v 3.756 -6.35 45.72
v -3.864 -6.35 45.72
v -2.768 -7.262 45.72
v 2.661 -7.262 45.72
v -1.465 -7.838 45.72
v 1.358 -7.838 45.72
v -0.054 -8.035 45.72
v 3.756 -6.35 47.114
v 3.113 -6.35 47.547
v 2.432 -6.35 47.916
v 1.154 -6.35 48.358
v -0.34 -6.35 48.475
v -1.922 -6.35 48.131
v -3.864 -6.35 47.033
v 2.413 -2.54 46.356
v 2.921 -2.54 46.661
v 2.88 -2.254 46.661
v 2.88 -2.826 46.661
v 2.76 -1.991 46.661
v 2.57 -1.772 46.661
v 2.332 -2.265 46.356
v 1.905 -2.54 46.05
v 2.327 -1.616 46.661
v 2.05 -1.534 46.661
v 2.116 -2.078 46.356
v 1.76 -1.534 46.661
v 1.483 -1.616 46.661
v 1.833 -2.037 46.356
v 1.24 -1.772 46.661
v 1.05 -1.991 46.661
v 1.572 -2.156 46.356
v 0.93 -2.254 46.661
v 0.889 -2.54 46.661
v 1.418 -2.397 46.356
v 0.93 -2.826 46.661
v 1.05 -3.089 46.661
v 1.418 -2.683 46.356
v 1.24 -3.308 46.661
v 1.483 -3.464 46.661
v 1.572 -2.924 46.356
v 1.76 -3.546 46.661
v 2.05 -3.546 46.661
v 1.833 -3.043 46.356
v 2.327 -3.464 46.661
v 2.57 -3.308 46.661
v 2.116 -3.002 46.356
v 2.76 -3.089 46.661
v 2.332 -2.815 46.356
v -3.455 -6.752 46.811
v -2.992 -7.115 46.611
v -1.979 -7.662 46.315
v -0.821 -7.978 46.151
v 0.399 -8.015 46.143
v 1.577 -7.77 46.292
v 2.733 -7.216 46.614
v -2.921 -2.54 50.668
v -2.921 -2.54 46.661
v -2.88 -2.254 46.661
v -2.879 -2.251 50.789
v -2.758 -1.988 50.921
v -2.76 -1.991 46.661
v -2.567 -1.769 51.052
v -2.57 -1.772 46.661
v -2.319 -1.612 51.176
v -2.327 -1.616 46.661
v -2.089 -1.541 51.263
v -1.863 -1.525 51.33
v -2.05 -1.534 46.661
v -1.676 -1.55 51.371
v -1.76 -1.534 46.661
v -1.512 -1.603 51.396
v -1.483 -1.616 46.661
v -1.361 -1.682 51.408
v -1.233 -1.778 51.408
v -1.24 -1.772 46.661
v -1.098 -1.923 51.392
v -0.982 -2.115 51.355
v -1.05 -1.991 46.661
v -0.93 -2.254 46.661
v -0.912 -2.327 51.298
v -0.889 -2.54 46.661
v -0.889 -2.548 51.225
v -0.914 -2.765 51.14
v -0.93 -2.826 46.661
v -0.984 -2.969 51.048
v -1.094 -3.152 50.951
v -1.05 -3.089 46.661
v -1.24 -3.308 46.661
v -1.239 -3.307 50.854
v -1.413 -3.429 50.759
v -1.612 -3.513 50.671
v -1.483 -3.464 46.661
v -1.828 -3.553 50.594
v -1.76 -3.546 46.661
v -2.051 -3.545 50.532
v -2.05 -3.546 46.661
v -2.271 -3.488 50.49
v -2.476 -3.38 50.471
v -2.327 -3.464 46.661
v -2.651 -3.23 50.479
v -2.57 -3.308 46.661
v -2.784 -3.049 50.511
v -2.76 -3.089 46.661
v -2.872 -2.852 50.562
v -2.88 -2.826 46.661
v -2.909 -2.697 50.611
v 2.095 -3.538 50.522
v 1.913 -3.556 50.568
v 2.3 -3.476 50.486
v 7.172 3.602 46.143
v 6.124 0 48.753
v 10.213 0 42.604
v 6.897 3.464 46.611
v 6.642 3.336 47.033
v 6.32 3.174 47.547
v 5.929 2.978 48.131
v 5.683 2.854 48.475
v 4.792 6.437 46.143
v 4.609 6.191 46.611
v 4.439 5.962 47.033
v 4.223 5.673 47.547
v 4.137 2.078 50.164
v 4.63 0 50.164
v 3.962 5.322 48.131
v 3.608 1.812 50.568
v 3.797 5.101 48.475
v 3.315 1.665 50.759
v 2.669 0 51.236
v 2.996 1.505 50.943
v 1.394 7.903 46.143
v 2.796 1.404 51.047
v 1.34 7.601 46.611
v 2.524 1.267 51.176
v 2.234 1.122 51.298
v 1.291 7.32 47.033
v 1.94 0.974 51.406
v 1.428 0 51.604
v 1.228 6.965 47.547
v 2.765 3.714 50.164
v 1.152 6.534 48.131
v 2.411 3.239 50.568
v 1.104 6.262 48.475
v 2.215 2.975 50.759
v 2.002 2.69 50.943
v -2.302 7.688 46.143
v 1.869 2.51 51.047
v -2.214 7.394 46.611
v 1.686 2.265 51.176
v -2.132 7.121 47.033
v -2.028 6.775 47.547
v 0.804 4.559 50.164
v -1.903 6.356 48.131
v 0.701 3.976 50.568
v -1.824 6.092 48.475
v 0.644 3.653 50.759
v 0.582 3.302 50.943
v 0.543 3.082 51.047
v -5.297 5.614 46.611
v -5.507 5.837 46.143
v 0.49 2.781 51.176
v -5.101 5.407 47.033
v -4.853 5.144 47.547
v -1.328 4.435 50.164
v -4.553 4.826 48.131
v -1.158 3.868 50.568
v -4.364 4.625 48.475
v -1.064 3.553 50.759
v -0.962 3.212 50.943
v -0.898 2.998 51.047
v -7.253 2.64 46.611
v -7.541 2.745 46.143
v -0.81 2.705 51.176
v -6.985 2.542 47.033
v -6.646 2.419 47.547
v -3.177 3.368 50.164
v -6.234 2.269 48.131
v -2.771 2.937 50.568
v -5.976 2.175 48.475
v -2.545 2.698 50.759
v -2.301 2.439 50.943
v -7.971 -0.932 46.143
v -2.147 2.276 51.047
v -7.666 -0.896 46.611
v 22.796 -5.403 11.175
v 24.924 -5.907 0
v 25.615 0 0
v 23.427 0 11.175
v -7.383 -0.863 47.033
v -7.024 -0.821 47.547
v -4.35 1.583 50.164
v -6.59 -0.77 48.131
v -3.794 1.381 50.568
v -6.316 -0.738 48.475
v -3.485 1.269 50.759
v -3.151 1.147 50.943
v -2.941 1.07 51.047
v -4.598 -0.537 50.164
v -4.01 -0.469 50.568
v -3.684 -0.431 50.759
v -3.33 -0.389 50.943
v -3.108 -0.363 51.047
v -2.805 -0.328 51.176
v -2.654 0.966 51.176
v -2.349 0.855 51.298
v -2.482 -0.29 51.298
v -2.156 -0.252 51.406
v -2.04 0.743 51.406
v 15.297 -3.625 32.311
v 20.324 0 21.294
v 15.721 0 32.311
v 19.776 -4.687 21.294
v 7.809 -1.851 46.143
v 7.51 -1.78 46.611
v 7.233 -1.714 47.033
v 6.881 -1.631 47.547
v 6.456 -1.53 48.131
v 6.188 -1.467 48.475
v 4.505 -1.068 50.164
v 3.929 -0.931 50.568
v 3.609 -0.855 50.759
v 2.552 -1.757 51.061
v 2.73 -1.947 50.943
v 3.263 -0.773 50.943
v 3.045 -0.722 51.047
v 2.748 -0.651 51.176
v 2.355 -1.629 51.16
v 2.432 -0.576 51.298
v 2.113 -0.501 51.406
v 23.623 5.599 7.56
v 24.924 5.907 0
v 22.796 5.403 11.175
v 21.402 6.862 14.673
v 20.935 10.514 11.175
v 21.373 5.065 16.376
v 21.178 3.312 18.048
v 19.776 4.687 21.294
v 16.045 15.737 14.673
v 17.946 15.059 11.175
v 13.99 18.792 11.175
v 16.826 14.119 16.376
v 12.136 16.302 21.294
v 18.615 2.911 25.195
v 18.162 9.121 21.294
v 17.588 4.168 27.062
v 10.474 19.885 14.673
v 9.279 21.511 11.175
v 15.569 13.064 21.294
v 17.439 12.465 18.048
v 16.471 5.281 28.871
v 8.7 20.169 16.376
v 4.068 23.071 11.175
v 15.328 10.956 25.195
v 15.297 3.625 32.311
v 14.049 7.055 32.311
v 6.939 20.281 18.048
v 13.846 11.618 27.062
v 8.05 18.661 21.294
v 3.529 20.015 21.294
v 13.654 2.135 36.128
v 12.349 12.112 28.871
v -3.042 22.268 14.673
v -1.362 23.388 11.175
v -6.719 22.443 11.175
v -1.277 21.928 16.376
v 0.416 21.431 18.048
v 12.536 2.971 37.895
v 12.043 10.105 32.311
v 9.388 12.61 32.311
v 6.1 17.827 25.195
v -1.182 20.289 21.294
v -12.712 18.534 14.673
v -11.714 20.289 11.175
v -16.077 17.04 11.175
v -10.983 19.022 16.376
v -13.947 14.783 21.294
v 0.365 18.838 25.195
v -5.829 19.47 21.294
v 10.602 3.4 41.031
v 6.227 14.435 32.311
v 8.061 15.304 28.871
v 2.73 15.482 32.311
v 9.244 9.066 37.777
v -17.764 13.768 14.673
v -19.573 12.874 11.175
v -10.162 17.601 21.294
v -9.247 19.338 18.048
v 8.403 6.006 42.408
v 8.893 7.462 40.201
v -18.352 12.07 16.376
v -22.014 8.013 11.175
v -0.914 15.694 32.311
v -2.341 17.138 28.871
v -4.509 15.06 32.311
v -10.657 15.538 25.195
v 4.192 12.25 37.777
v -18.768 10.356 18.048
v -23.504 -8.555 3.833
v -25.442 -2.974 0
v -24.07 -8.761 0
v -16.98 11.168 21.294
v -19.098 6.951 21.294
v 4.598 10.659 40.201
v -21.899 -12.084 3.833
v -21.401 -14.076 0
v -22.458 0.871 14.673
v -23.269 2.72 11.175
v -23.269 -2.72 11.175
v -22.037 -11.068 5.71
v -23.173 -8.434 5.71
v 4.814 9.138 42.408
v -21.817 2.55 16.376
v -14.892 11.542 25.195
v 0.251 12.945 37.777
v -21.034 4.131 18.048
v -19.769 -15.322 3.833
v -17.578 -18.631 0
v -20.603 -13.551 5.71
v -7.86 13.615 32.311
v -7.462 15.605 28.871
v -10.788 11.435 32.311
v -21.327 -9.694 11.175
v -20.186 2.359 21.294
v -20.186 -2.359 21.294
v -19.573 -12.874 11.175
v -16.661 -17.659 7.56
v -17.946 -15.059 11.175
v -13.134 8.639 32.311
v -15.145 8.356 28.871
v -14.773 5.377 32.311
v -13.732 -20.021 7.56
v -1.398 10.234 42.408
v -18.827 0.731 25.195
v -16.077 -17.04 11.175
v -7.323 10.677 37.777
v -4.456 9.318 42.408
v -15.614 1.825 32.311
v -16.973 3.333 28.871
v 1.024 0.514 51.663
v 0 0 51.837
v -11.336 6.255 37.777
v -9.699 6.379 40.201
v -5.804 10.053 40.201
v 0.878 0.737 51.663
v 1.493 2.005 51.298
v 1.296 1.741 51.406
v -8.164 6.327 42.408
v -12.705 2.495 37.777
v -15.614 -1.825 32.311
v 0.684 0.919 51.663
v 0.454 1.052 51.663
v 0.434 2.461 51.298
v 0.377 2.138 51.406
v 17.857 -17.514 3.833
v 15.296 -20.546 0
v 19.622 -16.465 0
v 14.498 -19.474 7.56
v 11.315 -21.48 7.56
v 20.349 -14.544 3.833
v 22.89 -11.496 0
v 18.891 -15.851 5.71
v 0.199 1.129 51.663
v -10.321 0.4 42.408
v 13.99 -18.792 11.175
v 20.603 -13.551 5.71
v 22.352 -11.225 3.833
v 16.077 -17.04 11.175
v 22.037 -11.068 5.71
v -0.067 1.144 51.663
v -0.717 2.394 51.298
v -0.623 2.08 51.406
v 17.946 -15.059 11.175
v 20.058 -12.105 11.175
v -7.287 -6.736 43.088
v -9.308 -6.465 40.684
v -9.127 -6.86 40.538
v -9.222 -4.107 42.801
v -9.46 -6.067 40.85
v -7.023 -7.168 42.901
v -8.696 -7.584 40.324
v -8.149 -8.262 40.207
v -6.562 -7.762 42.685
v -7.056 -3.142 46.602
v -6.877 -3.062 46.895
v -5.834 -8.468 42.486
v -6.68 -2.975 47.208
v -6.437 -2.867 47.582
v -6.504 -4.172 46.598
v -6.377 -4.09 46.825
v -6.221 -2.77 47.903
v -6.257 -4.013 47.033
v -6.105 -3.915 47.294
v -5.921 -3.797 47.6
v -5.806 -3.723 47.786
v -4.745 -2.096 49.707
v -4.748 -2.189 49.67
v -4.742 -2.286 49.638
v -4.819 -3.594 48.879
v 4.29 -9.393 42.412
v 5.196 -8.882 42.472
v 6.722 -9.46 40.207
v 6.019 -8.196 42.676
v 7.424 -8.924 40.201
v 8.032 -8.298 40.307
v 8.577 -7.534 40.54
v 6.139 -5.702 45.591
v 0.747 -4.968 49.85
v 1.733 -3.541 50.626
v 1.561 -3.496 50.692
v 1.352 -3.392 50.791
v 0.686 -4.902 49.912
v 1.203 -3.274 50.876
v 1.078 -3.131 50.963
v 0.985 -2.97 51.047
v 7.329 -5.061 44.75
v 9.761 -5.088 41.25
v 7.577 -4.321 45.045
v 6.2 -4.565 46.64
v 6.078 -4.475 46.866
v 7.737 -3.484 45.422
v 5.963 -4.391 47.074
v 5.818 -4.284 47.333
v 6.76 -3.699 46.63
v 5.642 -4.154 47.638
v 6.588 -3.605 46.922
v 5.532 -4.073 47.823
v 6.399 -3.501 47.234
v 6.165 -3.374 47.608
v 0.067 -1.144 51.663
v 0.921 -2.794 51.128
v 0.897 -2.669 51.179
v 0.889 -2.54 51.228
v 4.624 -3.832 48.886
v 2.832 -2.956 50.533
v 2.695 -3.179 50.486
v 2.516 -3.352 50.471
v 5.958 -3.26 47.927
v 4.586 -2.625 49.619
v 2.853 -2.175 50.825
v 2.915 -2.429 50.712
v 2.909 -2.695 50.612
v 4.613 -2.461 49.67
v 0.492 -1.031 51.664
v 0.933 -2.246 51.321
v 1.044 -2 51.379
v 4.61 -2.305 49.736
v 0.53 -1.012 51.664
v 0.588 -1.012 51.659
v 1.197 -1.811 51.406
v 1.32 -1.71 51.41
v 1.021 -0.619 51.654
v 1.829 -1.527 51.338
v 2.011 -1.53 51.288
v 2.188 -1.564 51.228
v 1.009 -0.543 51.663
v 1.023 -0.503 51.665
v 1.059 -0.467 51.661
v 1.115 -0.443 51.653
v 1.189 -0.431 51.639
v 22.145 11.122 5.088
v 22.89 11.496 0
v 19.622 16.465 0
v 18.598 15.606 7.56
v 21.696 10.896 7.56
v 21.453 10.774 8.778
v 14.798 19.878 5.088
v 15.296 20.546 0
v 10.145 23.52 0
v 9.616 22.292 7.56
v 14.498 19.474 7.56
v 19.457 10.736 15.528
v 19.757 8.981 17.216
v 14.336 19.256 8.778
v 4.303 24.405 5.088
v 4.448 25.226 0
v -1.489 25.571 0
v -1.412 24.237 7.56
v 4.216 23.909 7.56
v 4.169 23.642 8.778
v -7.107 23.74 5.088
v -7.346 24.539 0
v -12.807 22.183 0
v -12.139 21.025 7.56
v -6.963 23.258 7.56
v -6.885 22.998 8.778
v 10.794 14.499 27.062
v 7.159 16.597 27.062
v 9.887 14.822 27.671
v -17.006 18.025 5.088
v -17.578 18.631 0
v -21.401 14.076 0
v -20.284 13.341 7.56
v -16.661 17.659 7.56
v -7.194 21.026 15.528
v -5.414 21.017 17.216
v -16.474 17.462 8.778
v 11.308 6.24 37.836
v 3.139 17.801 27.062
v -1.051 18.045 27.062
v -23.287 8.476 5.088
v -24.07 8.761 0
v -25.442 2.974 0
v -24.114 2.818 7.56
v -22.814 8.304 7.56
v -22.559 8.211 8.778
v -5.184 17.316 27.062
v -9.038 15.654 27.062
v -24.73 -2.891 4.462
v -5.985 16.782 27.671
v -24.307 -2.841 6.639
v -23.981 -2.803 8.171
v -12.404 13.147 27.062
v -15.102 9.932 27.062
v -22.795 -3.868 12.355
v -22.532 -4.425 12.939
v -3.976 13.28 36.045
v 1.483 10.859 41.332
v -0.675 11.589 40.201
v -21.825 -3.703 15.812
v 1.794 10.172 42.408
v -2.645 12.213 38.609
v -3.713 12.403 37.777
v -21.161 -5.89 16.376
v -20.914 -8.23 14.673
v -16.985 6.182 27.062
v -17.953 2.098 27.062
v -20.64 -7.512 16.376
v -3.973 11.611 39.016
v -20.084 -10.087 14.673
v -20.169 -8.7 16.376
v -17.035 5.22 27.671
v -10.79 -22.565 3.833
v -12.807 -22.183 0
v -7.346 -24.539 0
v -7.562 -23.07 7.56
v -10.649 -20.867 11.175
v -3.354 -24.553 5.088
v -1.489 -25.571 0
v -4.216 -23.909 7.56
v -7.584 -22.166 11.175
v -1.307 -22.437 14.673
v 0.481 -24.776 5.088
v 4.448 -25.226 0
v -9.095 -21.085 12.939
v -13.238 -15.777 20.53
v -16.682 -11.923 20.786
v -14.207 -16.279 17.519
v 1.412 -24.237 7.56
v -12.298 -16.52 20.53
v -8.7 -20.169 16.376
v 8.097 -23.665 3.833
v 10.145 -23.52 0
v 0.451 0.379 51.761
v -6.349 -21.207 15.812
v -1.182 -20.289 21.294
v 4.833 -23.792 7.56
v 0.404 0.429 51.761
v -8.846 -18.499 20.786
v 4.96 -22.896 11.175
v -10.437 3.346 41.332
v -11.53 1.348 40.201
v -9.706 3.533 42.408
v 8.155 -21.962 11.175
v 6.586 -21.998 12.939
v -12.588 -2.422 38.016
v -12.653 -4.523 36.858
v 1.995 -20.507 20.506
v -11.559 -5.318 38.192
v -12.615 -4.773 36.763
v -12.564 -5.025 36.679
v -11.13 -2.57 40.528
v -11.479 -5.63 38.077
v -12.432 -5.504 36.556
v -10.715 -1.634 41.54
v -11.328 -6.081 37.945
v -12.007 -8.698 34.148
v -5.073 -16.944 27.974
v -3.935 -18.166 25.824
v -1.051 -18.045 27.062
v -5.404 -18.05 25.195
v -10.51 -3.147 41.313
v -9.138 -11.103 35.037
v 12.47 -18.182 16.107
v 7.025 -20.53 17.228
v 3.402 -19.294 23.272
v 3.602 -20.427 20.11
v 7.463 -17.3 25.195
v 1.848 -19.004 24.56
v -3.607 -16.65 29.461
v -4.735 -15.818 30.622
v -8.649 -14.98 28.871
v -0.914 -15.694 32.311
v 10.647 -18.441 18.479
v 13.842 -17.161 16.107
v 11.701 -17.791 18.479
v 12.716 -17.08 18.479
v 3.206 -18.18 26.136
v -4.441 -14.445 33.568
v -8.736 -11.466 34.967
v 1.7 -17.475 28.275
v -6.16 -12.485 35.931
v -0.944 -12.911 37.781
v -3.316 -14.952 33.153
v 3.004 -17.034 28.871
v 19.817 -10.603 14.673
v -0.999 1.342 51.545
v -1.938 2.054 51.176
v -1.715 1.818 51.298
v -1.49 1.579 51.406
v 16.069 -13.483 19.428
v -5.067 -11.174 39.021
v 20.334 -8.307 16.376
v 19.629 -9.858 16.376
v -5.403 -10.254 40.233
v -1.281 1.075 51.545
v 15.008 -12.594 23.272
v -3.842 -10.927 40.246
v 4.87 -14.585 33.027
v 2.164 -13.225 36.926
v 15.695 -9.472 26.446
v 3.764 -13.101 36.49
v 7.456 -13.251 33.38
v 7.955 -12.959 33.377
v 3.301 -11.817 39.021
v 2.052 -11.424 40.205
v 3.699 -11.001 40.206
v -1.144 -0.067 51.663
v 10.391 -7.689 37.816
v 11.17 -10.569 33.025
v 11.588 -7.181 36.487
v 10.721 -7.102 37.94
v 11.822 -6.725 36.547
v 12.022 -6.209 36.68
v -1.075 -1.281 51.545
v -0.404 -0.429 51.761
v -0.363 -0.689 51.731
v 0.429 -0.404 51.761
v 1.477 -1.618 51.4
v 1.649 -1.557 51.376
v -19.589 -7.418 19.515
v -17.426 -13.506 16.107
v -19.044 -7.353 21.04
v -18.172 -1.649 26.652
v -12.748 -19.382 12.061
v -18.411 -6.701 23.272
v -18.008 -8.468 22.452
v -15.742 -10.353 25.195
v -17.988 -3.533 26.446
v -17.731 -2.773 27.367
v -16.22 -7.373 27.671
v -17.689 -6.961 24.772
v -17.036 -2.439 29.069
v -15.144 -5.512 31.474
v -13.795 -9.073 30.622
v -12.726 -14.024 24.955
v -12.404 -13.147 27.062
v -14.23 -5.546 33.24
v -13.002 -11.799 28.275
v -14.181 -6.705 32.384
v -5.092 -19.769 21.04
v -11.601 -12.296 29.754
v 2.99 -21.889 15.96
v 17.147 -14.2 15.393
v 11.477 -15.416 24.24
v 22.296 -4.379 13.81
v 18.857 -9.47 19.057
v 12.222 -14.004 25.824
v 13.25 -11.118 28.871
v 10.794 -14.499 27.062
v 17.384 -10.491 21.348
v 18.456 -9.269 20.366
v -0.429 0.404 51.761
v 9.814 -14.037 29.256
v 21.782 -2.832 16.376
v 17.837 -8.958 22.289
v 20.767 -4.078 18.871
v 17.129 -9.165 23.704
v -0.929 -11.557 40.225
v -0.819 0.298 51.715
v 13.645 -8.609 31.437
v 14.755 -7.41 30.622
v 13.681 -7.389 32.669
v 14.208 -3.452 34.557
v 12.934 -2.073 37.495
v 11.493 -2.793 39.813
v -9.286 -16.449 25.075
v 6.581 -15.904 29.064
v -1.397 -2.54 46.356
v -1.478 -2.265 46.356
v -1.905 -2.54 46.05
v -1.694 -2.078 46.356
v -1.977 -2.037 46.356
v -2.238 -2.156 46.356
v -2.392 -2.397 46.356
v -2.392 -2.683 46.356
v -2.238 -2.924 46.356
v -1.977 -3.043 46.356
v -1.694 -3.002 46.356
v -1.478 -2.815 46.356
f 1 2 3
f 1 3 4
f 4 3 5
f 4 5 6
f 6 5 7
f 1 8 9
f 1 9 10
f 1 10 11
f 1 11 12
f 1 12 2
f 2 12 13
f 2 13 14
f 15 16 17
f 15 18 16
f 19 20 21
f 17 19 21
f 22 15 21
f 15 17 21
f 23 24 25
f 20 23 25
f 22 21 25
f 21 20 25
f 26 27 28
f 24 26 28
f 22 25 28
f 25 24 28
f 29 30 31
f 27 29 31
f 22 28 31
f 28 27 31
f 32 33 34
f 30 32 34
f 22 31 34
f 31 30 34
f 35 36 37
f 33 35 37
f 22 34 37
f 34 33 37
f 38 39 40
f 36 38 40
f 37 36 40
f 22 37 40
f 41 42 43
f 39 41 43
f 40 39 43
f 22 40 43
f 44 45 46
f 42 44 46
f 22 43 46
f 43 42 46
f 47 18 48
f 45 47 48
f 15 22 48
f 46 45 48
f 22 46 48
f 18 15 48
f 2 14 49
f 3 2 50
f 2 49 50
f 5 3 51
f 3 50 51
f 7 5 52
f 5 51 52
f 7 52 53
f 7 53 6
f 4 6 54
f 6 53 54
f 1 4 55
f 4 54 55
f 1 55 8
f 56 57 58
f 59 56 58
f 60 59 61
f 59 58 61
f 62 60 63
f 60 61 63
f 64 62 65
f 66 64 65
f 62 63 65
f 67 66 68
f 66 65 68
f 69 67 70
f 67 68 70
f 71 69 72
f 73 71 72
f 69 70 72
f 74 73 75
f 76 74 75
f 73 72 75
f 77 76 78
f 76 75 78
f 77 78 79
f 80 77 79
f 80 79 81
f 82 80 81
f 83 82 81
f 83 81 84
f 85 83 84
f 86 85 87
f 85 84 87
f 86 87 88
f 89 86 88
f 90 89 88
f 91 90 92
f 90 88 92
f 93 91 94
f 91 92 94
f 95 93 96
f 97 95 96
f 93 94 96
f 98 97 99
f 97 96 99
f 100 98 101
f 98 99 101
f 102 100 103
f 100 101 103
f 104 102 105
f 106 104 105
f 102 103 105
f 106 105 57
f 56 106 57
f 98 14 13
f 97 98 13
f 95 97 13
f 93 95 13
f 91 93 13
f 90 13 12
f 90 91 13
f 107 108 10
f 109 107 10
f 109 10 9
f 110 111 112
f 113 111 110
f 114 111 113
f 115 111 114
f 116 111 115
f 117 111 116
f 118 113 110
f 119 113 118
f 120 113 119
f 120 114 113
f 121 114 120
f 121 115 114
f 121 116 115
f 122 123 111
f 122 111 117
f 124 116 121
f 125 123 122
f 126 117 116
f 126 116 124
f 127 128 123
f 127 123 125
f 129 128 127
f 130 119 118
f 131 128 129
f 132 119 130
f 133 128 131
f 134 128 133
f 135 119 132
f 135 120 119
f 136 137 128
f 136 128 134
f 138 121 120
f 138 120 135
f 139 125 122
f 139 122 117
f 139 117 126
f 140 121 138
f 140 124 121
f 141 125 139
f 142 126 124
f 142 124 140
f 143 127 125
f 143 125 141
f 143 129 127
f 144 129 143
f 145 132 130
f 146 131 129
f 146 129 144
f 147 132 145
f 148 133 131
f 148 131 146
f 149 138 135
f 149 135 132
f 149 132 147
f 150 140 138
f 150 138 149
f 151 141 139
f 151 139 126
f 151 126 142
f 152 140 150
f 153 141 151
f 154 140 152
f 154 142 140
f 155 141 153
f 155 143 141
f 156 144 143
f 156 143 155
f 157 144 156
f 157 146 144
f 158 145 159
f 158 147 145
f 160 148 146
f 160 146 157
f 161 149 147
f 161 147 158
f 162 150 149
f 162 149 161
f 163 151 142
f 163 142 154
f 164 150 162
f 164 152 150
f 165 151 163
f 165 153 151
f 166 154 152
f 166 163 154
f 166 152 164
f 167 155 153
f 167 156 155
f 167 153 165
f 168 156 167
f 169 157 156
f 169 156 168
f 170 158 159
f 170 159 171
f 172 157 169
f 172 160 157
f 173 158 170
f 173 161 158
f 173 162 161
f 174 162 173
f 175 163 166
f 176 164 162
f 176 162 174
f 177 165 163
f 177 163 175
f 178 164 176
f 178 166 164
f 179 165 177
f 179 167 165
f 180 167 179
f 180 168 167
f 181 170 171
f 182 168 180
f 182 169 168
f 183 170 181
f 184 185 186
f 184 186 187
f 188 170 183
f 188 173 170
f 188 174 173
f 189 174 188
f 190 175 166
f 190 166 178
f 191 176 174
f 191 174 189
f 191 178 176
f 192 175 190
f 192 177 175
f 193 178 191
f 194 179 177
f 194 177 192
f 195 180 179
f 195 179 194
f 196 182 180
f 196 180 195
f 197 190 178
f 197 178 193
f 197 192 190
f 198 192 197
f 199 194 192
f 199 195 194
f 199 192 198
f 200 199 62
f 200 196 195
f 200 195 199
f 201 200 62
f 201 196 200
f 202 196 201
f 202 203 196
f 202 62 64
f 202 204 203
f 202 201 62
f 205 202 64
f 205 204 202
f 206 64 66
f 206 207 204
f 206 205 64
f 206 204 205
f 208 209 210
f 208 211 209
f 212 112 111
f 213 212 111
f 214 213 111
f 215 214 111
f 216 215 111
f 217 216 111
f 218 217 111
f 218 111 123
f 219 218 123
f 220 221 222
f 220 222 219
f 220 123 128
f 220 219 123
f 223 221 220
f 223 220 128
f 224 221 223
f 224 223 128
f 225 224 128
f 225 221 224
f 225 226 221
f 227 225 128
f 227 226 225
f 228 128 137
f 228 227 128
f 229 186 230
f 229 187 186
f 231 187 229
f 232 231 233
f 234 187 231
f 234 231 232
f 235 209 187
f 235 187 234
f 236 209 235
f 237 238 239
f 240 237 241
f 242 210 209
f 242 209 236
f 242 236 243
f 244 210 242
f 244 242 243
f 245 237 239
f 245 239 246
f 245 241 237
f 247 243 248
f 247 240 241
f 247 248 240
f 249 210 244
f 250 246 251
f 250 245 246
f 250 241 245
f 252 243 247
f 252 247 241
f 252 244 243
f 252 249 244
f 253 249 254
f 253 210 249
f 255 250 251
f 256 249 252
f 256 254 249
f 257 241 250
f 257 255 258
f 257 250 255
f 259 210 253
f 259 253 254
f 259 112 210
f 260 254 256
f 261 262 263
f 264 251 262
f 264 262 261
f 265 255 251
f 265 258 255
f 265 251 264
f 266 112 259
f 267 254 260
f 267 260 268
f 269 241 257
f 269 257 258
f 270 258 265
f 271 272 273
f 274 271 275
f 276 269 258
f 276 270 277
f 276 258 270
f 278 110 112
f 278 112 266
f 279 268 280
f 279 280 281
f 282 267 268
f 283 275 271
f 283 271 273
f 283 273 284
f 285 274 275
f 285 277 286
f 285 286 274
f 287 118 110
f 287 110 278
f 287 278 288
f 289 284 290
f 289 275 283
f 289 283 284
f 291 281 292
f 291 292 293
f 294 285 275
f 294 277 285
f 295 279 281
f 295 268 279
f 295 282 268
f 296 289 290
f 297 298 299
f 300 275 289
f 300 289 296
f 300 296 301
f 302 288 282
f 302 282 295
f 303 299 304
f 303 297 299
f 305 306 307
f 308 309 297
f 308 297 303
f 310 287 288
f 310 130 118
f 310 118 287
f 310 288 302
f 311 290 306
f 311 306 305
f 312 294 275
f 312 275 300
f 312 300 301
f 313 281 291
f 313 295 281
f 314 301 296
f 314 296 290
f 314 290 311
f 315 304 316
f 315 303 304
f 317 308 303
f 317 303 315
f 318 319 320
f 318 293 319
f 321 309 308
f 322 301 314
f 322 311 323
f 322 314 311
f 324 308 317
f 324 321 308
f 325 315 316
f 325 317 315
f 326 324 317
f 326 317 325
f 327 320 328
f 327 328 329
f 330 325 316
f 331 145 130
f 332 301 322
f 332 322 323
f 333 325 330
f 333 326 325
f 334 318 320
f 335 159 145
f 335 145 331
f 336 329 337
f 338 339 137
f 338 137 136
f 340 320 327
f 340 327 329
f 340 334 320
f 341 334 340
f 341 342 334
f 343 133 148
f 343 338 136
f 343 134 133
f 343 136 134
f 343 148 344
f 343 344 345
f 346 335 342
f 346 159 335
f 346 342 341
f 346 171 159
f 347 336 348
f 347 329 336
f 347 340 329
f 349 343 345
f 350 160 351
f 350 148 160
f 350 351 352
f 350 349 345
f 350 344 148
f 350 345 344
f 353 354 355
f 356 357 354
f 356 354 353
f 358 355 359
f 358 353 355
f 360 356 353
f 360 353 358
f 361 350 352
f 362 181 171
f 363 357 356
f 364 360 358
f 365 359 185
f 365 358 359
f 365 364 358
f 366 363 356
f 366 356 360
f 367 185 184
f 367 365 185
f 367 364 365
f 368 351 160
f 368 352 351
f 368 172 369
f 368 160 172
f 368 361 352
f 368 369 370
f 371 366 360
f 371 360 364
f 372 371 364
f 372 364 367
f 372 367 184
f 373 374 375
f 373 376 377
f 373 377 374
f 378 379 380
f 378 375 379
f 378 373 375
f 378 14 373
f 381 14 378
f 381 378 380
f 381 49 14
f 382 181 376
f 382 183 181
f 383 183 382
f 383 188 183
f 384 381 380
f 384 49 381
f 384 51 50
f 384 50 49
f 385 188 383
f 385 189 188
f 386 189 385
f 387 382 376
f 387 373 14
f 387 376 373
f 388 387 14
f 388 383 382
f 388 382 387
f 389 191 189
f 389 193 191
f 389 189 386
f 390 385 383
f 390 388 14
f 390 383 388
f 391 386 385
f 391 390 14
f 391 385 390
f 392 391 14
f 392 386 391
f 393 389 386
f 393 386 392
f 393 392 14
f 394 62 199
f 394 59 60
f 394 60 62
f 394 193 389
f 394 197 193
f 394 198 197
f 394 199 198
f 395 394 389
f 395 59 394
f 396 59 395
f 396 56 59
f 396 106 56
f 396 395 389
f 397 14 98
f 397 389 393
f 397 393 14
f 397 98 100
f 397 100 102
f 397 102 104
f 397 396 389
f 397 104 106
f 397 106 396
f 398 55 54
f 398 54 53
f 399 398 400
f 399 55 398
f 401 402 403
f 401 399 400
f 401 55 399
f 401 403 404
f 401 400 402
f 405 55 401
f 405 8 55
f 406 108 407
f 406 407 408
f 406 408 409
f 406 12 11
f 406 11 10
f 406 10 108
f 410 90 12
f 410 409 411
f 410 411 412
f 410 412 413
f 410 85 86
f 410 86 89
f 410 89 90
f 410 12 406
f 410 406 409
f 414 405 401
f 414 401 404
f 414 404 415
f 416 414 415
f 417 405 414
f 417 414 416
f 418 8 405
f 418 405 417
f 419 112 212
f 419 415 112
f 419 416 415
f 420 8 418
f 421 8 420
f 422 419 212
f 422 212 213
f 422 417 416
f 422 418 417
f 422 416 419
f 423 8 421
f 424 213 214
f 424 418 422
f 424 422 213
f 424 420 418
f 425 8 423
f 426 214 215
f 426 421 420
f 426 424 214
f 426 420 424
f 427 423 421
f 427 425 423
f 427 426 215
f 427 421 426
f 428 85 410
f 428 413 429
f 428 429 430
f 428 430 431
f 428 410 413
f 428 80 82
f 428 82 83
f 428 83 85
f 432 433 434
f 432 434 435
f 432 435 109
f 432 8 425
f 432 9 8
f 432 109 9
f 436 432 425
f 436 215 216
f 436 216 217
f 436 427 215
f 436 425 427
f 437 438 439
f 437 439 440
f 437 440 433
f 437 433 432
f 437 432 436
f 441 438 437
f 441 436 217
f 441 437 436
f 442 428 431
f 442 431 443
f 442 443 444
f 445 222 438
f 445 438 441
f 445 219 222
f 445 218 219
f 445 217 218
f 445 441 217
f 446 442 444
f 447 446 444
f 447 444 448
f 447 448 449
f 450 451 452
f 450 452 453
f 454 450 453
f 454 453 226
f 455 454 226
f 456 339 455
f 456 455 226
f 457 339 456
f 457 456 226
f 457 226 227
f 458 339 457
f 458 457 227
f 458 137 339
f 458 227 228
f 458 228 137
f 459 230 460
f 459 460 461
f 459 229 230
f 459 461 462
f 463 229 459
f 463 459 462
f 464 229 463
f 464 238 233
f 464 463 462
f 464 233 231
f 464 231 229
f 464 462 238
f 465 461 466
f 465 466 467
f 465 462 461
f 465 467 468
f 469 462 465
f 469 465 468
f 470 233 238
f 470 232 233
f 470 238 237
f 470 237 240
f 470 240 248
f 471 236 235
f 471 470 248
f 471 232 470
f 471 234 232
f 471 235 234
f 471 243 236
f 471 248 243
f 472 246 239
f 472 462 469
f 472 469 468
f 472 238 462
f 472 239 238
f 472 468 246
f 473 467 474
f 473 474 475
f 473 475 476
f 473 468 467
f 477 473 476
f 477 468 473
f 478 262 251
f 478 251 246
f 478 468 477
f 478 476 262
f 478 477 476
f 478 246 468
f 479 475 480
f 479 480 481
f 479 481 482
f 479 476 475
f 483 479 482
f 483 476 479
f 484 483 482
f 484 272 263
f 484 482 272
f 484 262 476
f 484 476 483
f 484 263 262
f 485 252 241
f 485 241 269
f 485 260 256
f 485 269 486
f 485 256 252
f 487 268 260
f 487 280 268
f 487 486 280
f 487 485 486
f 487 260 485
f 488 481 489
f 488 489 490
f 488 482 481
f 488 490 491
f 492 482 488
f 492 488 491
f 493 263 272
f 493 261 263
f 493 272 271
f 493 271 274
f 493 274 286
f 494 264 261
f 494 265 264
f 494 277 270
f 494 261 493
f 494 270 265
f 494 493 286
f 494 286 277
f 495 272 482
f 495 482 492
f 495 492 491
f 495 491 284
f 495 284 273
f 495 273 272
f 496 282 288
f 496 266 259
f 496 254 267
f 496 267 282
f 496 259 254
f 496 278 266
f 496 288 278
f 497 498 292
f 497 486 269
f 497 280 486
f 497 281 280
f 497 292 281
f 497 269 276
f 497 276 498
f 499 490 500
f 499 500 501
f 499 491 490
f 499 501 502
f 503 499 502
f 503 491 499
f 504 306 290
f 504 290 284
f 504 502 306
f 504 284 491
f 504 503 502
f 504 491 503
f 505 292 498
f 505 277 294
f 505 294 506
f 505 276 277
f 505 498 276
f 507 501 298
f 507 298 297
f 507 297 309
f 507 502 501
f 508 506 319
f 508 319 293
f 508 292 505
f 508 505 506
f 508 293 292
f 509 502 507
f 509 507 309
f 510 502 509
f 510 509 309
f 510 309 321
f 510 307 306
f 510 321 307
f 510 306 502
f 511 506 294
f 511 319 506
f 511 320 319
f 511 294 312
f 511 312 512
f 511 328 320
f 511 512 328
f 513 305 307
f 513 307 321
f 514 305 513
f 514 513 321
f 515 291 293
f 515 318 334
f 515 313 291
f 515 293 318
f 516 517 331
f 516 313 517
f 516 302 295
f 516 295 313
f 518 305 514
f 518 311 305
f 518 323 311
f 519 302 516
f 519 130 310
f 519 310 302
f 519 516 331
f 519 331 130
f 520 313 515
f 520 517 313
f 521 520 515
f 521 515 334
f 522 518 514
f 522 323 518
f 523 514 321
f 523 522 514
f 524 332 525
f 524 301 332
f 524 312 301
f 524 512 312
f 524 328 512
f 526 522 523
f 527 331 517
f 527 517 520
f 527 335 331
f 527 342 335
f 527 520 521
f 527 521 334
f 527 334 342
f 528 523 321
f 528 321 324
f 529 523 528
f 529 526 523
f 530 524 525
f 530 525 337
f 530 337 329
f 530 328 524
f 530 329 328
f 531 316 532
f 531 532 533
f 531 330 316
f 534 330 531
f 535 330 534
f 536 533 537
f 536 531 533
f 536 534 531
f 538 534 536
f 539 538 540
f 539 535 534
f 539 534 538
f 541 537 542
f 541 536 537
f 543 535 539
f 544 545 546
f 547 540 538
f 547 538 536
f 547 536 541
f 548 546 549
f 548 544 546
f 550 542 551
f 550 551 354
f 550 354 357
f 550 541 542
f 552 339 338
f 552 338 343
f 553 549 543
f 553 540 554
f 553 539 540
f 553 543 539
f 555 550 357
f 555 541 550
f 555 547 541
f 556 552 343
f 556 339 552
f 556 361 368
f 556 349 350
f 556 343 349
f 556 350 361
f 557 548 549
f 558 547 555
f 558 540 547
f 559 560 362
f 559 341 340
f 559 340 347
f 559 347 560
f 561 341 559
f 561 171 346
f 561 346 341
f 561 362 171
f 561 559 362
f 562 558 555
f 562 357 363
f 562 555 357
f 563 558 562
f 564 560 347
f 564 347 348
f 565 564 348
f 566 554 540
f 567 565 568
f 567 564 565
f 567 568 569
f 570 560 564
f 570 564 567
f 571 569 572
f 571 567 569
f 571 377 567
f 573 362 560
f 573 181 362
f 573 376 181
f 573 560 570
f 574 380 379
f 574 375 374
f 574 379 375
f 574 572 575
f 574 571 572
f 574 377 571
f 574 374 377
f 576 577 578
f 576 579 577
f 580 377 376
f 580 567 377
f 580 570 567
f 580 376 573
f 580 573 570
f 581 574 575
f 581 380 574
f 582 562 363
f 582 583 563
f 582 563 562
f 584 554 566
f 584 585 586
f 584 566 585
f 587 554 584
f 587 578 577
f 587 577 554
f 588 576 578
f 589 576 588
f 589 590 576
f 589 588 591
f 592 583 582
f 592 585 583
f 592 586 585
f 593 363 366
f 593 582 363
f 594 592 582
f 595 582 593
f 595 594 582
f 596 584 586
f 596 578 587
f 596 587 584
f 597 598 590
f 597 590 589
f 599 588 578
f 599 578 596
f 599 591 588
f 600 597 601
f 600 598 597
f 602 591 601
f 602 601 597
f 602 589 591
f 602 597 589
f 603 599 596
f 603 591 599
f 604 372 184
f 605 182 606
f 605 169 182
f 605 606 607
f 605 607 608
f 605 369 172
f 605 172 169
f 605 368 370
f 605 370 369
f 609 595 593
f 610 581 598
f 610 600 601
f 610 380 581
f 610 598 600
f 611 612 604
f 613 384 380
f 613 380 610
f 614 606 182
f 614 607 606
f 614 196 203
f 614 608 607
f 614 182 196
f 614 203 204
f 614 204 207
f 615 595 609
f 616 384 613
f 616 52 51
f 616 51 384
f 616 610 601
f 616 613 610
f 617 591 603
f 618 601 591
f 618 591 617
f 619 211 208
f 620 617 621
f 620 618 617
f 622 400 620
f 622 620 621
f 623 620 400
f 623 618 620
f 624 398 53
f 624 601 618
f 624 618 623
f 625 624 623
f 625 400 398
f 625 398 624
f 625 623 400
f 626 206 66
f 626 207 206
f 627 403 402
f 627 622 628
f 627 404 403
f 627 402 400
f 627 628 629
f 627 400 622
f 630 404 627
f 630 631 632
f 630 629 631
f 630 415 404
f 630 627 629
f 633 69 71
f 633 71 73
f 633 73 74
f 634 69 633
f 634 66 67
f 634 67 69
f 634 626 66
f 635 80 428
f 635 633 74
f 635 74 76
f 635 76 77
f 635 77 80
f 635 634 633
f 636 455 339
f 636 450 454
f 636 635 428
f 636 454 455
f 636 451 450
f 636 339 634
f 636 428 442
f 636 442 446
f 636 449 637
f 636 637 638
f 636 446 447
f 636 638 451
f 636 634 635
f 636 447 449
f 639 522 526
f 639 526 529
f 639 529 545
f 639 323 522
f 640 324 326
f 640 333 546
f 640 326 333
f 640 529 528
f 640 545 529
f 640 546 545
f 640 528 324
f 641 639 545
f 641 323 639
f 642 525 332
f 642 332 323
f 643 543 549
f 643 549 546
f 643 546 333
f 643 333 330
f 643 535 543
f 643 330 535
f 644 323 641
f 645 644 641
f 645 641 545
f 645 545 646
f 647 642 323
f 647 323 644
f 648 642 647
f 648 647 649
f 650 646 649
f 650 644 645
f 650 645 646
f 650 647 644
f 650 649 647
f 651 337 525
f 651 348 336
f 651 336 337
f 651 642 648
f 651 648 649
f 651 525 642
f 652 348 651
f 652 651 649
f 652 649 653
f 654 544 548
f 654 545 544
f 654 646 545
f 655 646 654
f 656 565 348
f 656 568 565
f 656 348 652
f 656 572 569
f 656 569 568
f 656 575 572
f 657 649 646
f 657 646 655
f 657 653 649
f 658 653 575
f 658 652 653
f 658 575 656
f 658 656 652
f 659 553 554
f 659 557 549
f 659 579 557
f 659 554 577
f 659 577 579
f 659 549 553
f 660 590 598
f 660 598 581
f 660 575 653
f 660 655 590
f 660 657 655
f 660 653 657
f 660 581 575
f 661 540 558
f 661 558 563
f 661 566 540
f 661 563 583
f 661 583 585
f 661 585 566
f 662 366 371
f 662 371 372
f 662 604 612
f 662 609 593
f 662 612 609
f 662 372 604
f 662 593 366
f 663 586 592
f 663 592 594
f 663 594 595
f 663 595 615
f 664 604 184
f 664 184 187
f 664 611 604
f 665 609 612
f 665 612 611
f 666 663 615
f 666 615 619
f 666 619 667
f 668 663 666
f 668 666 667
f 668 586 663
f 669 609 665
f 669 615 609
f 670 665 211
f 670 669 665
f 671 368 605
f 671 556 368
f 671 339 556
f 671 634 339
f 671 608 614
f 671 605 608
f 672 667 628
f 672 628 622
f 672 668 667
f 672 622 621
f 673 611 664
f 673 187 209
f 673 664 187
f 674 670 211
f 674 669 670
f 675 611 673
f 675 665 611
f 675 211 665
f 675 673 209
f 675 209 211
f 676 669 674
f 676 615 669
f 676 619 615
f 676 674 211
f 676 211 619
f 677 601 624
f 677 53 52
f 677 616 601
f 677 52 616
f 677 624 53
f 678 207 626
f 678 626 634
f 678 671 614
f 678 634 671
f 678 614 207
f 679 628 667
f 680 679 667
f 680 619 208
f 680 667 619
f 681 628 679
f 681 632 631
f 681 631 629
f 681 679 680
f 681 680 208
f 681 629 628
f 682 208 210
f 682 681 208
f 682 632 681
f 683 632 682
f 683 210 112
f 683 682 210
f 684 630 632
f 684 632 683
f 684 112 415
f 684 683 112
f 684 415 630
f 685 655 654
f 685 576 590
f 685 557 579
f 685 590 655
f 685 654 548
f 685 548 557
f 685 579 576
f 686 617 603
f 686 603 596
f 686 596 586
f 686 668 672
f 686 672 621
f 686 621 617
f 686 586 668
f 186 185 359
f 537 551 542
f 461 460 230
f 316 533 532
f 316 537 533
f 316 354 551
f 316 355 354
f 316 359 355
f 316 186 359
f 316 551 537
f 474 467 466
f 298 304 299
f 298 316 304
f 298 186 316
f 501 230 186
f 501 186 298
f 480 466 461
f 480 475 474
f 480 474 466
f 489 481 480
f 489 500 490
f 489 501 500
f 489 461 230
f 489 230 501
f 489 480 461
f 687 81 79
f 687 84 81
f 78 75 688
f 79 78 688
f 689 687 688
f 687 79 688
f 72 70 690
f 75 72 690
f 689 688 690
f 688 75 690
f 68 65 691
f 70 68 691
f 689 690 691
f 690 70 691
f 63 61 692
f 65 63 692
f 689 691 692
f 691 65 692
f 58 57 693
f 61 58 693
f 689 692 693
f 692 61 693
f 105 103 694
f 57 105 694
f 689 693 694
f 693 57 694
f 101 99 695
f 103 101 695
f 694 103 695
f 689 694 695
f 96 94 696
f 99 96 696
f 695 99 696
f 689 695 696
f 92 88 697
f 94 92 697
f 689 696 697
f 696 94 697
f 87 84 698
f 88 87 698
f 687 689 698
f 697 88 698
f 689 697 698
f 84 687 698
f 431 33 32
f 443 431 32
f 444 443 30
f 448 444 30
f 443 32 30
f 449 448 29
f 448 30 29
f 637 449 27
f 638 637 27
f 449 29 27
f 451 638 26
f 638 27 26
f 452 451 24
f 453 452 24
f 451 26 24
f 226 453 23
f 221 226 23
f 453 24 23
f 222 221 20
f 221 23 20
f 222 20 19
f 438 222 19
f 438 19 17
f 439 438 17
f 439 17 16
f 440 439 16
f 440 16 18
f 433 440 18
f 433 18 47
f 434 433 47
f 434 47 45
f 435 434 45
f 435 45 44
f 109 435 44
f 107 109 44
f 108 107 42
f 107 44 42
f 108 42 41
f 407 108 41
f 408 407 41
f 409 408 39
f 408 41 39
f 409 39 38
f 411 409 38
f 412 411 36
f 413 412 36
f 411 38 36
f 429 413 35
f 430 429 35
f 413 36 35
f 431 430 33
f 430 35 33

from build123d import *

# Parameters (mm, degrees)
F4_D     = 2.032
F4_DEPTH = 3.81
F4_START = 13.0290755
F4_TIP   = 0.6104743889
F5_DEPTH = 17.78


with BuildPart() as f1:
    # F0 (on Front) → F1 (revolve)
    with BuildSketch(Plane.XZ):
        with BuildLine():
            Line((0, 51.8371127546), (0, 0))
            Line((0, 0), (25.6147161126, 0))
            add(Edge.make_bspline(
                [(25.6147161126, 0), (22.8049212909, 20.5093036404), (9.6490421389, 44.5611330733), (4.4700330506, 51.3505992855), (0, 51.8371127546)],
                knots=[0, 0, 0, 0, 0.6778847742, 1, 1, 1, 1], degree=3))
        make_face()
    revolve(axis=Axis((0, 0, 25.9185563773), (0, 0, 1)))

    # F4
    # its depths count from where the whole tool has entered the part; down to there all is cleared
    with Locations(Plane.XY.offset(63.5)):
        with Locations((-1.905, -2.54), (1.905, -2.54)):
            Hole(F4_D / 2, depth=F4_START)
    with Locations(Plane.XY.offset(63.5).offset(-F4_START)):
        with Locations((-1.905, -2.54), (1.905, -2.54)):
            Hole(F4_D / 2, depth=F4_DEPTH)
            with Locations((0, 0, -(F4_DEPTH + F4_TIP / 2))):  # 118° drill point
                Cone(0, F4_D / 2, F4_TIP, mode=Mode.SUBTRACT)

    # F3 (on offset) → F5 (cut)
    with BuildSketch(Plane.XY.offset(63.5)):
        with BuildLine():
            Line((3.7562806858, -6.35), (-3.8637193142, -6.35))
            ThreePointArc((-3.8637193142, -6.35), (-0.0537193142, -8.035230032), (3.7562806858, -6.35))
        make_face()
    extrude(amount=-F5_DEPTH, mode=Mode.SUBTRACT)


solid = f1.part
